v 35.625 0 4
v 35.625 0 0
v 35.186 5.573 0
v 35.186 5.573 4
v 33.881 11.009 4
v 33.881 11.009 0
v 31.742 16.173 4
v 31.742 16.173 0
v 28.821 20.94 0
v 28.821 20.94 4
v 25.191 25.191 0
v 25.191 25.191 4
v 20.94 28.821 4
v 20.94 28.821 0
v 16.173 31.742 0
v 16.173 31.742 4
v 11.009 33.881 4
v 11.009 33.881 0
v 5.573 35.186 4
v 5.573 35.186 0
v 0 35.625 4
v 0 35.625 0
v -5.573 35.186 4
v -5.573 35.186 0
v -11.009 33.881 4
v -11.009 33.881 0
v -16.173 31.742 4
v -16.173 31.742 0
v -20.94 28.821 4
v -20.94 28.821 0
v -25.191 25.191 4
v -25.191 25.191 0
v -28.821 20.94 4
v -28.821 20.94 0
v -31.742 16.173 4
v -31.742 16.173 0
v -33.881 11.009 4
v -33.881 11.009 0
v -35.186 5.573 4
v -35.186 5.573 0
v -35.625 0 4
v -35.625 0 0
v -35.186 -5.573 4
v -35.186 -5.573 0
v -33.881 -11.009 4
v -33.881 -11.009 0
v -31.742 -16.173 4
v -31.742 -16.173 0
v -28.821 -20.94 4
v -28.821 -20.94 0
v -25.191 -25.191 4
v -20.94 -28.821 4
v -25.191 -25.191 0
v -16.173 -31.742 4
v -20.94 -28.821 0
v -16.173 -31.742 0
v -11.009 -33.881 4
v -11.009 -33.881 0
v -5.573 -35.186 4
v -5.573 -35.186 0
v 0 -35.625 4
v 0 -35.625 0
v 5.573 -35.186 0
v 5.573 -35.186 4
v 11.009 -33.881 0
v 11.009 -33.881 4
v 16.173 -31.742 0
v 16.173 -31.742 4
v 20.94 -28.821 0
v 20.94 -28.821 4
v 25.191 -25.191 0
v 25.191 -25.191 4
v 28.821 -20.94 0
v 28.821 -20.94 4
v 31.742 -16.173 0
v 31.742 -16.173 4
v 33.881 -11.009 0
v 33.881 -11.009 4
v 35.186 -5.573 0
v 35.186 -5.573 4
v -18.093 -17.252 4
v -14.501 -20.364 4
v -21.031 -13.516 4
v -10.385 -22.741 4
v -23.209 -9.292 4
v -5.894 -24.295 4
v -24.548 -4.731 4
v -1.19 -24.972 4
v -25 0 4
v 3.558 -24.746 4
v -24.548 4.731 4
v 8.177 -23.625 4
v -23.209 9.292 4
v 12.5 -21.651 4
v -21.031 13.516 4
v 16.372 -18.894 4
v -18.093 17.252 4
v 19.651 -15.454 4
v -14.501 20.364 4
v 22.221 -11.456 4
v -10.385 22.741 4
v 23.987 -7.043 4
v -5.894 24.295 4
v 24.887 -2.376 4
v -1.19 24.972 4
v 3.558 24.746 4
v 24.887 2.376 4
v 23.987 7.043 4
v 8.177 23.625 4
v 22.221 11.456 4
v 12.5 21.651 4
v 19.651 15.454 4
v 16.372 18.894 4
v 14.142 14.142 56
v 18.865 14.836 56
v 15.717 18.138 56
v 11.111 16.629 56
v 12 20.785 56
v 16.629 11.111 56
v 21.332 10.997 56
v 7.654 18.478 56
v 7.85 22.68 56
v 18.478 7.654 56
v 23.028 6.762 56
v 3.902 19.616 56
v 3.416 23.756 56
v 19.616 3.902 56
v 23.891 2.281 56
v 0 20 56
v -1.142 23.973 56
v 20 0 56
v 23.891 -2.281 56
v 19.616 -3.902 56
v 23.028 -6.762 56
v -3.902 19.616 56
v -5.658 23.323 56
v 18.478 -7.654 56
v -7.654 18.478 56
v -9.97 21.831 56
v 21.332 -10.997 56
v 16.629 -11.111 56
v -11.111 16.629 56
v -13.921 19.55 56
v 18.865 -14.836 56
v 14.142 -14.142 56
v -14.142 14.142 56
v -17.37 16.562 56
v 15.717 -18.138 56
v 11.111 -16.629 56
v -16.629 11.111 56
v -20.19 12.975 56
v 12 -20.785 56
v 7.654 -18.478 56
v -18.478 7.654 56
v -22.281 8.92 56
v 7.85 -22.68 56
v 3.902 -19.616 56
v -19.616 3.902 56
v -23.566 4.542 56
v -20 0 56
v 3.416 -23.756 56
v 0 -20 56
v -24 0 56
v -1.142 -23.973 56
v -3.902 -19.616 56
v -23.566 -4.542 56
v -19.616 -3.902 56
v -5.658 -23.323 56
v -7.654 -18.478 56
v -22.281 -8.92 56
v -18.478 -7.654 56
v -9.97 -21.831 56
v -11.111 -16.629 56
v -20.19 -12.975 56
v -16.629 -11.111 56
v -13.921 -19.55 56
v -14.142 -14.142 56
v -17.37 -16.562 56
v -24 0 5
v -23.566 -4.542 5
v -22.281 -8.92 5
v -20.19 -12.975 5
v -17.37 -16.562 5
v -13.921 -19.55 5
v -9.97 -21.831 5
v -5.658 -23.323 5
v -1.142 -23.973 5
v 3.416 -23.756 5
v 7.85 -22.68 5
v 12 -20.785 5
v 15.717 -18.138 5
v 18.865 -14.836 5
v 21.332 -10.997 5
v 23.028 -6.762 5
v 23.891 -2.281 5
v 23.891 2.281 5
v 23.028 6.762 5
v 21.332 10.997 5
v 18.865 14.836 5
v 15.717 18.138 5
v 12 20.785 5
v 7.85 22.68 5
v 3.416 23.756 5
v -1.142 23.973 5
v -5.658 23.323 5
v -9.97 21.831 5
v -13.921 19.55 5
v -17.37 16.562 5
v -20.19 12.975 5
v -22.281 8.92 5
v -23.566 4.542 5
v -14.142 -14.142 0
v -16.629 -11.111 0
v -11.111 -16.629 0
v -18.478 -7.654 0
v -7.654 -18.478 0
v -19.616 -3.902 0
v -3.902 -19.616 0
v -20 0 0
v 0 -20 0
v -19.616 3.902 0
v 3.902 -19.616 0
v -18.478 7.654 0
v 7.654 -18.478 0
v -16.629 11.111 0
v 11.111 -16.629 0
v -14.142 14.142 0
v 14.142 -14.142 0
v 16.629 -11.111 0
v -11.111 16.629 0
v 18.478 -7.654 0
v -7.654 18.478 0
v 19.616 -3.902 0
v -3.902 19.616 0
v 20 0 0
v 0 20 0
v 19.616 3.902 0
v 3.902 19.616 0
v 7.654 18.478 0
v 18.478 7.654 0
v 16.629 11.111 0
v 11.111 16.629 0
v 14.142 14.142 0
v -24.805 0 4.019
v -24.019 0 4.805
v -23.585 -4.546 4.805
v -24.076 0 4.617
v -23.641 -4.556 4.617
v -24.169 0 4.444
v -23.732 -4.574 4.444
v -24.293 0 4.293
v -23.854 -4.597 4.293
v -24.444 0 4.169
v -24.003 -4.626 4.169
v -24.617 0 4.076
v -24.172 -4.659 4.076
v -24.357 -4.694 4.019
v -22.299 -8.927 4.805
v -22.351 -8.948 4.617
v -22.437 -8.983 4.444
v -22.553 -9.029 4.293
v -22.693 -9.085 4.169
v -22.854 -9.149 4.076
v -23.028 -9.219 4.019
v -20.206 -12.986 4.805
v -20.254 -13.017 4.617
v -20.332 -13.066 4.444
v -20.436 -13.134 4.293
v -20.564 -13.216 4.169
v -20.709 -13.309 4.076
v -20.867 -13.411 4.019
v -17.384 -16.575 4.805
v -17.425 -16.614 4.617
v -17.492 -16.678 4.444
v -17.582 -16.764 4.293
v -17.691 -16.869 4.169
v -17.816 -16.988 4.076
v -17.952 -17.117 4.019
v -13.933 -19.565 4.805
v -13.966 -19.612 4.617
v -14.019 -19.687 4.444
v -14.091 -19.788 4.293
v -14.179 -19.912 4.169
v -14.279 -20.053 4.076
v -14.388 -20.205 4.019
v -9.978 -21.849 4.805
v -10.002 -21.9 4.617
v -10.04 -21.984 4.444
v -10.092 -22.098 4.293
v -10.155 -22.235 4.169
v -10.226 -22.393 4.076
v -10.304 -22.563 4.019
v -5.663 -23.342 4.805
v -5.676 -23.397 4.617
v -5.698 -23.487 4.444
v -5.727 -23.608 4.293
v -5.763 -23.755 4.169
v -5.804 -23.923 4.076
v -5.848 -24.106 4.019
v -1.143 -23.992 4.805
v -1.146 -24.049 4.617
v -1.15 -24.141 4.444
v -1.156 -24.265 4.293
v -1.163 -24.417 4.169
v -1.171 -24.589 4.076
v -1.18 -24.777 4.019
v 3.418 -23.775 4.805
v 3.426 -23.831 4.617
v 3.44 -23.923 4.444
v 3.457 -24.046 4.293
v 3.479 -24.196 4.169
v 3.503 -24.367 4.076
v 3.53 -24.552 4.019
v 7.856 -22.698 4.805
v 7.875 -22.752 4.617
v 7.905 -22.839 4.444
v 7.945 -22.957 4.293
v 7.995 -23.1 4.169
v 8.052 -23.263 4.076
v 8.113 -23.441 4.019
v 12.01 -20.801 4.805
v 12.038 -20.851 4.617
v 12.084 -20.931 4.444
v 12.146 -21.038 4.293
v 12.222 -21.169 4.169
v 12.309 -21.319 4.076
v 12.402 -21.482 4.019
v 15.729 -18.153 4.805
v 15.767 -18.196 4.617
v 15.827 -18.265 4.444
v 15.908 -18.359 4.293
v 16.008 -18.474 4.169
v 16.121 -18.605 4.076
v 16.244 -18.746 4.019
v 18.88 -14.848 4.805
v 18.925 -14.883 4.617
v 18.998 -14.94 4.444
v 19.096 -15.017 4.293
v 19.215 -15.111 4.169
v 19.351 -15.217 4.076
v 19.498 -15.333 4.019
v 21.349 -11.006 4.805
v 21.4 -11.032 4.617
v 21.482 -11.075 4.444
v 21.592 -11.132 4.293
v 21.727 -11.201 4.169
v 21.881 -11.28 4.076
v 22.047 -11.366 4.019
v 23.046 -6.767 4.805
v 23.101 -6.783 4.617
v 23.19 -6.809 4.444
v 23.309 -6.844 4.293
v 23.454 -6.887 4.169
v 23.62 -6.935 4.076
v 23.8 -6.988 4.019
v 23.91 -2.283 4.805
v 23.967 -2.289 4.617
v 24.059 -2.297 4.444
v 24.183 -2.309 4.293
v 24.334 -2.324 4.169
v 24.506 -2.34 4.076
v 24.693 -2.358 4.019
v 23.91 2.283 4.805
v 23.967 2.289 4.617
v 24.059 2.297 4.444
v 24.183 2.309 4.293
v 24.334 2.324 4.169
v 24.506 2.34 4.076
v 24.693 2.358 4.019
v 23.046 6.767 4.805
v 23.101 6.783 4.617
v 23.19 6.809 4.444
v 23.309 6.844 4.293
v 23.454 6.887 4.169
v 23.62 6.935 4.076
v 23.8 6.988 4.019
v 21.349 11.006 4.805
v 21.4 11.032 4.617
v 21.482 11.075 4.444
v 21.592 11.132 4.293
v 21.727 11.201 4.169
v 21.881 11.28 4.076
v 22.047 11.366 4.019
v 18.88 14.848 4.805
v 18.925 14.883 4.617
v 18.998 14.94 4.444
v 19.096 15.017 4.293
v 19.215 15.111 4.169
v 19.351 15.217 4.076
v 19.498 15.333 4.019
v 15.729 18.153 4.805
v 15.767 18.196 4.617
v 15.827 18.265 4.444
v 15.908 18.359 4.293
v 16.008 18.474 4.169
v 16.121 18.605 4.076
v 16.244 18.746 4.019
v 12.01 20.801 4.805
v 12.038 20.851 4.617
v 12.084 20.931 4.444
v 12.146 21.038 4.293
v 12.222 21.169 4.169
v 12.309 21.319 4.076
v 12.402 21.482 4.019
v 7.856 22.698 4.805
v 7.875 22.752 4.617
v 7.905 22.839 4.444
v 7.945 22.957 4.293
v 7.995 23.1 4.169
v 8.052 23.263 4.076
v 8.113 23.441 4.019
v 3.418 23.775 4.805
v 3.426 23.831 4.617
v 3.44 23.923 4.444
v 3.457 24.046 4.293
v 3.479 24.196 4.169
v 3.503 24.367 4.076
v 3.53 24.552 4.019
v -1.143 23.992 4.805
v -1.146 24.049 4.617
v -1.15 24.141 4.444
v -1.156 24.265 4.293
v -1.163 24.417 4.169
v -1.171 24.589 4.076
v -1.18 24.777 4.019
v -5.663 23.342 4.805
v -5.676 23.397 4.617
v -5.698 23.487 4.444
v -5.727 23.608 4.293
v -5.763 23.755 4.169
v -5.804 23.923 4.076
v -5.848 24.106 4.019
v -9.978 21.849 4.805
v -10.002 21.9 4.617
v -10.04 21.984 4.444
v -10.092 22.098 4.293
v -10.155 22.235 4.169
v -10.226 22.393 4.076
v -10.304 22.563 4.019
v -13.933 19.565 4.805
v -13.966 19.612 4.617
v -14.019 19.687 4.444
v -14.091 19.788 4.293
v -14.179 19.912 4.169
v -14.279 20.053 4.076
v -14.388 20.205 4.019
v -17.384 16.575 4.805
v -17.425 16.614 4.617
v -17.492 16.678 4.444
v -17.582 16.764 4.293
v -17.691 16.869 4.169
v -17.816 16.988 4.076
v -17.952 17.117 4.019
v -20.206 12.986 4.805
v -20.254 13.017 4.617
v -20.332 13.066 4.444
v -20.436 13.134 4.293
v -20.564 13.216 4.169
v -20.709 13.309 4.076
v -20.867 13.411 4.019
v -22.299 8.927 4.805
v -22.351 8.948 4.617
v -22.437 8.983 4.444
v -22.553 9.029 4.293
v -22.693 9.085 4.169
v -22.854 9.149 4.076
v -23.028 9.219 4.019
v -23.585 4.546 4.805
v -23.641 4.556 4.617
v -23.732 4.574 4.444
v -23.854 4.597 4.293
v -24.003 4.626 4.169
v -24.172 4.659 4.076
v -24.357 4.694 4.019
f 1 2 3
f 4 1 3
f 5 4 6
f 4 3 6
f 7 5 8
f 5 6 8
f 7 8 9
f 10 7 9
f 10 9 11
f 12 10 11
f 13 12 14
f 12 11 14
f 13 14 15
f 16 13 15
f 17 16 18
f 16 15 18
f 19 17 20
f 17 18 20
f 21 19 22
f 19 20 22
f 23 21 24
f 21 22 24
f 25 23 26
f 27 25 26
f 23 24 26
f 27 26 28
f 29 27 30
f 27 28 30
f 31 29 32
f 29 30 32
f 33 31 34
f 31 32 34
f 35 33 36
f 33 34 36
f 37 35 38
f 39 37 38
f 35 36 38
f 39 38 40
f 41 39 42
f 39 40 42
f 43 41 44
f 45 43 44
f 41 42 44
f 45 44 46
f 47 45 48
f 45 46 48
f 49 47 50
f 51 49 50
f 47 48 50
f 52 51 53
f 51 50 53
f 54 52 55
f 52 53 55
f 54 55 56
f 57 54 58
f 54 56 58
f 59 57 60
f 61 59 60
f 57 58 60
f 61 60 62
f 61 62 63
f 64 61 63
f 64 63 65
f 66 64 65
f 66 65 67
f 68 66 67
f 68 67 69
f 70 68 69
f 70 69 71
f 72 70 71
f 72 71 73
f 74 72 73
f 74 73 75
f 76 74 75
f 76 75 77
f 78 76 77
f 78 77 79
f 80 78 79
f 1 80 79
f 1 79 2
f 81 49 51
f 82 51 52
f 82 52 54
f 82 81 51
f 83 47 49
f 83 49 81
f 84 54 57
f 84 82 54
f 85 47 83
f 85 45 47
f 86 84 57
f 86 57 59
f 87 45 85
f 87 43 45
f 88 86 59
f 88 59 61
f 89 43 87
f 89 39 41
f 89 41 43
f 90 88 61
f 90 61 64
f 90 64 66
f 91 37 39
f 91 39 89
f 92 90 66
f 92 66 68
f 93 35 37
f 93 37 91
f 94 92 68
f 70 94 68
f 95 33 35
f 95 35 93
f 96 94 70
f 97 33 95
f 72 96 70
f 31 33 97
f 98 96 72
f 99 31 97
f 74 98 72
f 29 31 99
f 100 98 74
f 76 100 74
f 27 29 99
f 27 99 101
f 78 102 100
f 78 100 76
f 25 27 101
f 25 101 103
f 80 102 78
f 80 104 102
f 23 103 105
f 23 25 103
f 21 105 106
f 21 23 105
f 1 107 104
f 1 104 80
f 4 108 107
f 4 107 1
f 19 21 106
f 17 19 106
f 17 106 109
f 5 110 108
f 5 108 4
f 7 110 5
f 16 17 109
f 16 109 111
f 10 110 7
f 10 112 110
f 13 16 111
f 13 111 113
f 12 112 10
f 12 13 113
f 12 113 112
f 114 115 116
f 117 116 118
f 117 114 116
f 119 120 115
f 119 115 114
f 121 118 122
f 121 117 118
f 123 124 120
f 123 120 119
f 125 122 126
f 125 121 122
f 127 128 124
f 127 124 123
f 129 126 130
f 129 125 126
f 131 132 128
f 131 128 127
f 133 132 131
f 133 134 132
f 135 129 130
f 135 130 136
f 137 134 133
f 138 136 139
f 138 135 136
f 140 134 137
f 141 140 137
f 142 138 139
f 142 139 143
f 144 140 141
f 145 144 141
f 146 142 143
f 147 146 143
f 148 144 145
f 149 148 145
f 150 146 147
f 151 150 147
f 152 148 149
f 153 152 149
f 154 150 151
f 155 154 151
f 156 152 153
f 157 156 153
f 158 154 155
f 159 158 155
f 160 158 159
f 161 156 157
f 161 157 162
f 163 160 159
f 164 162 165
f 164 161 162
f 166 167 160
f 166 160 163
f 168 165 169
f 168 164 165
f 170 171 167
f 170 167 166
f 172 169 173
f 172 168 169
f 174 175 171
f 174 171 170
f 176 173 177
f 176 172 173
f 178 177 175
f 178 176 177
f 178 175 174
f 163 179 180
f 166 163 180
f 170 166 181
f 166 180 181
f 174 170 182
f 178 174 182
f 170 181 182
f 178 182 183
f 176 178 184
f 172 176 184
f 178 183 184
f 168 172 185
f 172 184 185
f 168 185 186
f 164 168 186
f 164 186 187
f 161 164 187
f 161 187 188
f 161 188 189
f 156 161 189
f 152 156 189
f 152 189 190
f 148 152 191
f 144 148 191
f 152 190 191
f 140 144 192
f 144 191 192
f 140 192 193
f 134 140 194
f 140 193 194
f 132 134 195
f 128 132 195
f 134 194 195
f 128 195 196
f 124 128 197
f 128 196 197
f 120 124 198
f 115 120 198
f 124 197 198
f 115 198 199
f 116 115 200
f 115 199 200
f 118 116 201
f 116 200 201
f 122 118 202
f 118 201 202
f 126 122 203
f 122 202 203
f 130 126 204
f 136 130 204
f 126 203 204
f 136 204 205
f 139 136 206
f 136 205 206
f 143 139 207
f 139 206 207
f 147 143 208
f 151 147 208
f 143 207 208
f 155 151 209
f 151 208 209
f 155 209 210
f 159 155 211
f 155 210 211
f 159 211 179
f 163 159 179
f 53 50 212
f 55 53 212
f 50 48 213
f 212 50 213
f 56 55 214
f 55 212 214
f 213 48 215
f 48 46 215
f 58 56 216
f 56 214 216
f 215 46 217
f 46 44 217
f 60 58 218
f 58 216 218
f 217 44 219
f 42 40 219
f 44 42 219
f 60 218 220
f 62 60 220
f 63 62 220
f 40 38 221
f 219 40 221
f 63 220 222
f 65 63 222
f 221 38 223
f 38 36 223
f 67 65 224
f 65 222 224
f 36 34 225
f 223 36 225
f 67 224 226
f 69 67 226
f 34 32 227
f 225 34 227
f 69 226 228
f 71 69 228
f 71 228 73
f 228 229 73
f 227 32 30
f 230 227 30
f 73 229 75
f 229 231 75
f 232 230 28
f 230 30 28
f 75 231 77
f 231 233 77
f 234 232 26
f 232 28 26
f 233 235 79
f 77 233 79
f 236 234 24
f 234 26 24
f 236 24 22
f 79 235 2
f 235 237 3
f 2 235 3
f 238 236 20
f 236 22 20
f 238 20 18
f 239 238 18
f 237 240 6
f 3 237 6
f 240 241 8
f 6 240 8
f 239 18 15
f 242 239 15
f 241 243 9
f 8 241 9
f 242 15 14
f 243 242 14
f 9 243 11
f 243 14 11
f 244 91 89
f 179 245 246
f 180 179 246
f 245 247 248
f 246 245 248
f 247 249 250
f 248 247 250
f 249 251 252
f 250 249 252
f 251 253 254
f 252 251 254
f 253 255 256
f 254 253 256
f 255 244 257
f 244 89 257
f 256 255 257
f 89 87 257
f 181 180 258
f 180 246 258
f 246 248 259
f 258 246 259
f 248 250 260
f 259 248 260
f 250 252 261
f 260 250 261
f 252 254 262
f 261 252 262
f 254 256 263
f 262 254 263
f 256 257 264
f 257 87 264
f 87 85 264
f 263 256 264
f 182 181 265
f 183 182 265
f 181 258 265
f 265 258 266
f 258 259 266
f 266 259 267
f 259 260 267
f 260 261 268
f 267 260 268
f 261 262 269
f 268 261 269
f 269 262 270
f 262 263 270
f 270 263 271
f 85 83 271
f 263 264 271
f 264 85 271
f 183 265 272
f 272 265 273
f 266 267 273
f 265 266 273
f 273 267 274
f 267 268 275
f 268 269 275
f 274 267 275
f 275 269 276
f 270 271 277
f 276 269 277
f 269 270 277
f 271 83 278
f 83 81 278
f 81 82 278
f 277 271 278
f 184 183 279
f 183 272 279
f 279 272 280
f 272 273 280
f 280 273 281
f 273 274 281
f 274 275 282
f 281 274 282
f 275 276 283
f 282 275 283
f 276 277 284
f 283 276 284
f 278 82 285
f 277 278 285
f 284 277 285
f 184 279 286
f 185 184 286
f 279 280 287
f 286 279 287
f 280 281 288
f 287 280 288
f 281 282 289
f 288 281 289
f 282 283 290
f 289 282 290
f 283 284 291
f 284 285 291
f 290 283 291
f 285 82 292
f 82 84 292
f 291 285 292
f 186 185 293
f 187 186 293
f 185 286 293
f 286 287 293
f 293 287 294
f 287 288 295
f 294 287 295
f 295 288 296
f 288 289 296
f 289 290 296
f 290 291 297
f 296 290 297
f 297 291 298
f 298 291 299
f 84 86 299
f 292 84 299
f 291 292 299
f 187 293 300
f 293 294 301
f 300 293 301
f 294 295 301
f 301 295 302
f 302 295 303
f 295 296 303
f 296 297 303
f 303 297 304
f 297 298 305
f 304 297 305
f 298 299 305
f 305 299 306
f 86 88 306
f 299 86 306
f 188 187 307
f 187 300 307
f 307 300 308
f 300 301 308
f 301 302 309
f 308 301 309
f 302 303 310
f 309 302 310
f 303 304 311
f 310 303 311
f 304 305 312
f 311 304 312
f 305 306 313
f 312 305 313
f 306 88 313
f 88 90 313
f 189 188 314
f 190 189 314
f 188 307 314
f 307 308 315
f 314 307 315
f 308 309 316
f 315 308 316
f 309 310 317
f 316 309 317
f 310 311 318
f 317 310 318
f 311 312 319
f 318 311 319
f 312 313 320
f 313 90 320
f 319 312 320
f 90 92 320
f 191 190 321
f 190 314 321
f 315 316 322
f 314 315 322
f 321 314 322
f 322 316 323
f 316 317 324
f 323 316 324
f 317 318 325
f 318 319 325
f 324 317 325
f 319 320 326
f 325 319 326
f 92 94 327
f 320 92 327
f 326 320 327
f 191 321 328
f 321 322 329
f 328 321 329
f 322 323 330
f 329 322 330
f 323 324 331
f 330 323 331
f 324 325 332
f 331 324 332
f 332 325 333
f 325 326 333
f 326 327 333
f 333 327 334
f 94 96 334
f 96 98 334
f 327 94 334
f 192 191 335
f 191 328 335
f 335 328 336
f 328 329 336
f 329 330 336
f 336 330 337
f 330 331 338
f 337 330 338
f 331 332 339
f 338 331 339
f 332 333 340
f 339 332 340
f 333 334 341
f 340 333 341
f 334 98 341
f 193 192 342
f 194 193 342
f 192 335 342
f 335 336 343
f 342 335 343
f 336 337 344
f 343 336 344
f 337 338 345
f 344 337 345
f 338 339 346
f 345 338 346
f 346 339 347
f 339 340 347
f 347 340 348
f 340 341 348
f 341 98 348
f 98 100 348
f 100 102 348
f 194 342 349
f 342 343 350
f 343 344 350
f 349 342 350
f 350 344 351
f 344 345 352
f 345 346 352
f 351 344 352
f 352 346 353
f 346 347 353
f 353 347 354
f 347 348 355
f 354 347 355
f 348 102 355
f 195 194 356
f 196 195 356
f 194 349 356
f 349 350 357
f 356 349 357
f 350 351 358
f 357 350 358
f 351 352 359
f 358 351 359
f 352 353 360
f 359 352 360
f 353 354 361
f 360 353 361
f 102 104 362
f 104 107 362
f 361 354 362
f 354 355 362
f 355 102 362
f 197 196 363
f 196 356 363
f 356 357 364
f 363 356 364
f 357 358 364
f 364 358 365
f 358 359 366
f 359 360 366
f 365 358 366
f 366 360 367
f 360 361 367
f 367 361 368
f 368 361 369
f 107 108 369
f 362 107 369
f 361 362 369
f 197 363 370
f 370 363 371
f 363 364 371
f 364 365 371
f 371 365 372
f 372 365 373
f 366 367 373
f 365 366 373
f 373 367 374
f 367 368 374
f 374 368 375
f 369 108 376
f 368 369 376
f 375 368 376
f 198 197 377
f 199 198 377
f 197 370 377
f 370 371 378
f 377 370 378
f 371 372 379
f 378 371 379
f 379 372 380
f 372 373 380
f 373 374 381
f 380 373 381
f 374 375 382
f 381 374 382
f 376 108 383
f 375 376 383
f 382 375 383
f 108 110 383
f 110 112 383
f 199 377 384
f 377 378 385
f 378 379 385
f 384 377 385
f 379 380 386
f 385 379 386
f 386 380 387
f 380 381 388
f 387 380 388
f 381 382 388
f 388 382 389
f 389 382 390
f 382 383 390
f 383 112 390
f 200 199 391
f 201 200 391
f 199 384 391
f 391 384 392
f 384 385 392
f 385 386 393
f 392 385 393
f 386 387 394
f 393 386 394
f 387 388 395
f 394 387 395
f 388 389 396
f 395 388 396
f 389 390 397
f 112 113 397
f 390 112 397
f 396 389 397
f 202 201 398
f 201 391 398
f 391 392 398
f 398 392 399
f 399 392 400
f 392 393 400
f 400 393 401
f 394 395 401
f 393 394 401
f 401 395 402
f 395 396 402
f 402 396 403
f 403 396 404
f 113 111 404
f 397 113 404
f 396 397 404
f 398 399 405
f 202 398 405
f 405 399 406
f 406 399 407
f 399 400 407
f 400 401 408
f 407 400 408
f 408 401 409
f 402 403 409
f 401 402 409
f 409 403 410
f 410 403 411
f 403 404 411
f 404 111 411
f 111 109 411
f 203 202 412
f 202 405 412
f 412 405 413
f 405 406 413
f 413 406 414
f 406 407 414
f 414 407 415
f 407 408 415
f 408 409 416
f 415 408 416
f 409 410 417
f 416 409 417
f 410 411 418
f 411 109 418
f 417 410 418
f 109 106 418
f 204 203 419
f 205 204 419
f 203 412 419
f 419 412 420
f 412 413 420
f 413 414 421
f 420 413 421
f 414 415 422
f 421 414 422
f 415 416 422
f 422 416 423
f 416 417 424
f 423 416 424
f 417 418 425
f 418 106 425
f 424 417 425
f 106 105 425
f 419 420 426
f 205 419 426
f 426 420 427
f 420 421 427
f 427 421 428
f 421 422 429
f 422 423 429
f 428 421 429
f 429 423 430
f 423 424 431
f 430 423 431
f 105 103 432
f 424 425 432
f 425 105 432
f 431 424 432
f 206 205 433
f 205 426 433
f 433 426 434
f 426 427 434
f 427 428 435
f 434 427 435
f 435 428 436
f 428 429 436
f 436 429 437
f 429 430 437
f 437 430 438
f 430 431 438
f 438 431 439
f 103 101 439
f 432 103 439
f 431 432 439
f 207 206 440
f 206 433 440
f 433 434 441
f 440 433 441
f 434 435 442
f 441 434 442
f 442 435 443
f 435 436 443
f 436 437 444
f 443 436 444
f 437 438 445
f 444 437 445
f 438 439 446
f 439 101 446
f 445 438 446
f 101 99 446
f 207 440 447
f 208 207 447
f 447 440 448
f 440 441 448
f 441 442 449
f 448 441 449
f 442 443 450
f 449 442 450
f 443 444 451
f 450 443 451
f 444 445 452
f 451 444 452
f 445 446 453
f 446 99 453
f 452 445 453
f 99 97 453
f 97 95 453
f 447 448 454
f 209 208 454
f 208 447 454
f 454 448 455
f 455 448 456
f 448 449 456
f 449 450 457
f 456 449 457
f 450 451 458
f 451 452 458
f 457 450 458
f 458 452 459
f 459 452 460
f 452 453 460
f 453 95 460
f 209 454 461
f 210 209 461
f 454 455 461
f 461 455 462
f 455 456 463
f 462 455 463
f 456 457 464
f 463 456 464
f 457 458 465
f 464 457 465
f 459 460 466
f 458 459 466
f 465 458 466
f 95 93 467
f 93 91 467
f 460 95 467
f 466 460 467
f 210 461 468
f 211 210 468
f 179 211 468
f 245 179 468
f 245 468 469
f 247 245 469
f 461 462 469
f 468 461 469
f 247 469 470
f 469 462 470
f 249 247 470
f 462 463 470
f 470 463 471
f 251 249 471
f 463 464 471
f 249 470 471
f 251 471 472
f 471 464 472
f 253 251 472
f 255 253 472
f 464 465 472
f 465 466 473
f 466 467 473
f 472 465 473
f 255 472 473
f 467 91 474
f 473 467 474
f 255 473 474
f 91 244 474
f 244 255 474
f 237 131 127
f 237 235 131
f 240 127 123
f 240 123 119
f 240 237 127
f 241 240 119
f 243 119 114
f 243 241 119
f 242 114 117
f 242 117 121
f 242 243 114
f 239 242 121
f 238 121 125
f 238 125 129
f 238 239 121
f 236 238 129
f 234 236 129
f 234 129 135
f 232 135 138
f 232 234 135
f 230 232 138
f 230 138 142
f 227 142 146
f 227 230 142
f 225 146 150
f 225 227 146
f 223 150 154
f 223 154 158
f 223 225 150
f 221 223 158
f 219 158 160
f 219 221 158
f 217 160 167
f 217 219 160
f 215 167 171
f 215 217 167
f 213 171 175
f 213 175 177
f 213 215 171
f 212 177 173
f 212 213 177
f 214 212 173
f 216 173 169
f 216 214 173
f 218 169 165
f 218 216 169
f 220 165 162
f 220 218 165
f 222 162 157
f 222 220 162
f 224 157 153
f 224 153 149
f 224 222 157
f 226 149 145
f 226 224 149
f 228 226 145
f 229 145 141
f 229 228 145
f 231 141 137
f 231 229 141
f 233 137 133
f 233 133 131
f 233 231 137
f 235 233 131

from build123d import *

# Parameters (mm, degrees)
SKETCH1_R           = 35.625
SKETCH1_R_2         = 20
BOSS_EXTRUDE1_DEPTH = 4
SKETCH2_R           = 24
SKETCH2_R_2         = 20
BOSS_EXTRUDE2_DEPTH = 52
FILLET1_R           = 1


with BuildPart() as part:
    # Sketch1 → Boss-Extrude1 (new body)
    with BuildSketch(Plane.XY):
        Circle(SKETCH1_R)
        Circle(SKETCH1_R_2, mode=Mode.SUBTRACT)
    extrude(amount=BOSS_EXTRUDE1_DEPTH)

    # Sketch2 → Boss-Extrude2 (add)
    with BuildSketch(Plane.XY.offset(4)):
        with Locations(Location((0, 0, 0), (0, 0, 180))):
            Circle(SKETCH2_R)
        Circle(SKETCH2_R_2, mode=Mode.SUBTRACT)
    extrude(amount=BOSS_EXTRUDE2_DEPTH)

    # Fillet1
    fillet1_edges = [part.edges().sort_by_distance(p)[0] for p in [
        (24, 0, 4),
    ]]
    fillet(fillet1_edges, radius=FILLET1_R)


solid = part.part
